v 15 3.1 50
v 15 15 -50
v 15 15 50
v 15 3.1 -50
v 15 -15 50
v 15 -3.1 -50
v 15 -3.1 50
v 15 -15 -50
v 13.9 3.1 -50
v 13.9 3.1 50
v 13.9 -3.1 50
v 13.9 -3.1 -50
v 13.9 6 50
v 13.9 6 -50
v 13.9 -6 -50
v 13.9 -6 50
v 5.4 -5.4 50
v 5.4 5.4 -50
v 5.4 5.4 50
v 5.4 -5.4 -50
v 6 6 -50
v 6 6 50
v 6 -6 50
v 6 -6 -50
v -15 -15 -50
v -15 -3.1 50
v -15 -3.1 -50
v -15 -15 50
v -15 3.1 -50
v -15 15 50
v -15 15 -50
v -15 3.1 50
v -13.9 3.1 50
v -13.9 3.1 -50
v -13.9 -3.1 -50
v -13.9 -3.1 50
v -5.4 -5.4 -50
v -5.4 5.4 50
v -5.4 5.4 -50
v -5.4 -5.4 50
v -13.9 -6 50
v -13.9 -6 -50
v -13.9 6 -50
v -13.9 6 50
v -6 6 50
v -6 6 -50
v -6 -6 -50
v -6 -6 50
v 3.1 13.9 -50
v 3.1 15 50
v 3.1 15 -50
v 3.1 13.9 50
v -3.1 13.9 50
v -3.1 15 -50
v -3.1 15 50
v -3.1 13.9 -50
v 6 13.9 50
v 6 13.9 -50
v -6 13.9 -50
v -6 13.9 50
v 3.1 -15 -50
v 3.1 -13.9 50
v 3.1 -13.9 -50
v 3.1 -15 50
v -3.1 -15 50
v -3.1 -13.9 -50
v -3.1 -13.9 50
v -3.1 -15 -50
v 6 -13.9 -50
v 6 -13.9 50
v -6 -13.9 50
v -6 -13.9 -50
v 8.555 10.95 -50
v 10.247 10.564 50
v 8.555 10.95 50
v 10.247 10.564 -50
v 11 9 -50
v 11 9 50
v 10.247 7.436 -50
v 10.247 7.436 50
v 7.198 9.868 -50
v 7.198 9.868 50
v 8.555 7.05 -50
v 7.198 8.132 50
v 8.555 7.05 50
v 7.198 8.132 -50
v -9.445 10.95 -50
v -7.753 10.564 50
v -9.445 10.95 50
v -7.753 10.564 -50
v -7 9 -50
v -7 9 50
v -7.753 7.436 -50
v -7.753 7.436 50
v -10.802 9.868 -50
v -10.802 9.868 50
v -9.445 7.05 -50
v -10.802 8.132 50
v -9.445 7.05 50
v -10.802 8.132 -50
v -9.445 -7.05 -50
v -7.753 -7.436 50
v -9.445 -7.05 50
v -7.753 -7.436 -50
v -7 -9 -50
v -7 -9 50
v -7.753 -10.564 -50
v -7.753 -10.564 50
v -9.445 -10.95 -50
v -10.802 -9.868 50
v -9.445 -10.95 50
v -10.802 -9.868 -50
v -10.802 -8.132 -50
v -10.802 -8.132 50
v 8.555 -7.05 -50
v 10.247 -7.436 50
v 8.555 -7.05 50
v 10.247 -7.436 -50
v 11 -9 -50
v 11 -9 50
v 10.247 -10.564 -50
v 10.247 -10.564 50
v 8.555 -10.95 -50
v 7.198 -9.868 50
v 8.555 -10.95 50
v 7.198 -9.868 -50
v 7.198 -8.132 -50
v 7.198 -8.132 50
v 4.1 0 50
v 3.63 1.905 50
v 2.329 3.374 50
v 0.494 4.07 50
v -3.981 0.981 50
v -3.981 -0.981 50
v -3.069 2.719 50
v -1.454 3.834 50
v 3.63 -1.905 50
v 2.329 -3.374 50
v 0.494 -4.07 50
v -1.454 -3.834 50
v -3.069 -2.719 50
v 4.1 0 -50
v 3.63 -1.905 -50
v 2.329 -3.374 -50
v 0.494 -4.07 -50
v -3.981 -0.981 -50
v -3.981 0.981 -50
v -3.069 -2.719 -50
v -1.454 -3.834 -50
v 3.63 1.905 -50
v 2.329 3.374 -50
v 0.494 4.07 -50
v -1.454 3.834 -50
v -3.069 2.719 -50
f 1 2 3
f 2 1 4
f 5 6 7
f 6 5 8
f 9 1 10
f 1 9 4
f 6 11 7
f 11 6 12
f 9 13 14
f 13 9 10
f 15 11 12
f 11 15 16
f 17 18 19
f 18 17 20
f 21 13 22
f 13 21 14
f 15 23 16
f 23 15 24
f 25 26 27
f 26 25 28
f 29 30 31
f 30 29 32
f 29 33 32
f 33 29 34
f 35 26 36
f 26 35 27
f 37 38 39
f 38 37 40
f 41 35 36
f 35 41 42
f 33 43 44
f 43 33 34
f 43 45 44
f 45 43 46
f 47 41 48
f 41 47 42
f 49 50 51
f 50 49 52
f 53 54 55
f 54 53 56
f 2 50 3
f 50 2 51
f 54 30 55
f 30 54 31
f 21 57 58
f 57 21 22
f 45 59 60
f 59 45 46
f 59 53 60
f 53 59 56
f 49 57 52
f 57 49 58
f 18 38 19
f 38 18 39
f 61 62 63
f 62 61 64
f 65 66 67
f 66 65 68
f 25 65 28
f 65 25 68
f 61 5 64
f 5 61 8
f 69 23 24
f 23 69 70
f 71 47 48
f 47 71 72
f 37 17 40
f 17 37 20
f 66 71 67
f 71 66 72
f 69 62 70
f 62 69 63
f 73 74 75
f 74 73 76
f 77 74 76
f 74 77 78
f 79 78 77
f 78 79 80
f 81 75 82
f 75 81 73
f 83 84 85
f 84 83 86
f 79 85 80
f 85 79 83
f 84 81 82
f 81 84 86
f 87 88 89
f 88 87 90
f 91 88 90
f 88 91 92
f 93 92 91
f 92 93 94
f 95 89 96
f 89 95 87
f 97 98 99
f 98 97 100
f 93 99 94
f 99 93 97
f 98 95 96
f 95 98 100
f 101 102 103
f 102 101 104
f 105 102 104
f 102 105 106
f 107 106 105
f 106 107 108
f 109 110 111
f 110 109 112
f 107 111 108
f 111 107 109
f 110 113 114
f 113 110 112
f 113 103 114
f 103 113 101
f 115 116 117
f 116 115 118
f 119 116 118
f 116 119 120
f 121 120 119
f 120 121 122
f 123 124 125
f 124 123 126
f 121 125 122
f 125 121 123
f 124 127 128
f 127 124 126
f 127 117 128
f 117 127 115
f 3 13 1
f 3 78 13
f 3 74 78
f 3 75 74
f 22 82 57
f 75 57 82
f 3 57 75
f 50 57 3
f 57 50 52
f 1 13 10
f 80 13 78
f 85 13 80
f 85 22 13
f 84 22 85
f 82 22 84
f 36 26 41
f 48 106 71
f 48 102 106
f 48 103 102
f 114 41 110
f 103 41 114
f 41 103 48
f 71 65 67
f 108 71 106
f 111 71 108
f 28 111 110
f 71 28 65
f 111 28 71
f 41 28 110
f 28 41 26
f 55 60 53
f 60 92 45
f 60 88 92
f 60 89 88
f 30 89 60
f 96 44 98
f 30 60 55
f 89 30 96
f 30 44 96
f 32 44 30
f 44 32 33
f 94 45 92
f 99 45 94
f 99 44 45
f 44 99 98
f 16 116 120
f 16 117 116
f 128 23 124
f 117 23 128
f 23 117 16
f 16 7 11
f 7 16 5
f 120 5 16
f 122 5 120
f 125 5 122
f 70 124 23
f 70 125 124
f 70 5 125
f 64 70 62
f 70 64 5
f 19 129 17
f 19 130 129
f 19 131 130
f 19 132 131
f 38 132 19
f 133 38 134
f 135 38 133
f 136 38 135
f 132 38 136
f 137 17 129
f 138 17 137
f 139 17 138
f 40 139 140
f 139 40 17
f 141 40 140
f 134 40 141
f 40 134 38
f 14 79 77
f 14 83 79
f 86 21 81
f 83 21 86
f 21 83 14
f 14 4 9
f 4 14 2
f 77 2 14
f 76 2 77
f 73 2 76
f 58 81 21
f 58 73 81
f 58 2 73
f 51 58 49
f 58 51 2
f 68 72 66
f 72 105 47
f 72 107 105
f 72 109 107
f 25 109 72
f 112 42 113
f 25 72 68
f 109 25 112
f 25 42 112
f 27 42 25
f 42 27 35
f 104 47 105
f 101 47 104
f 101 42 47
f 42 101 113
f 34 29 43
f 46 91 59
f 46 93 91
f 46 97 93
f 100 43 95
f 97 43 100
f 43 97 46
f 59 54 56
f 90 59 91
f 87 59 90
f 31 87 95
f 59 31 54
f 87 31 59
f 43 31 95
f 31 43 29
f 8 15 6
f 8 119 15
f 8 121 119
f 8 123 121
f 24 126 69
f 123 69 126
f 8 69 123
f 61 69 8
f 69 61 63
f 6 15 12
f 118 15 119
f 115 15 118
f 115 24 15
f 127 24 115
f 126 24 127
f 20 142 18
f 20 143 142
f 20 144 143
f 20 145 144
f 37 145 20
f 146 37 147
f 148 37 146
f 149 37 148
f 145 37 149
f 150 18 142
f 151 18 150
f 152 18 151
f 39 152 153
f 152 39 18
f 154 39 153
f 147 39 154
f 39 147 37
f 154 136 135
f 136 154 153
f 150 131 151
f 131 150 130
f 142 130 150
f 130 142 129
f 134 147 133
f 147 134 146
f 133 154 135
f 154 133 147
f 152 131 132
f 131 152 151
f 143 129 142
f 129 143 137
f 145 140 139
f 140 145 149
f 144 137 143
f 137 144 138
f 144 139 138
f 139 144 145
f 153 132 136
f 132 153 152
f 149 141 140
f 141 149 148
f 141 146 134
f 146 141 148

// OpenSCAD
// Parameters
profile_width_mm = 30; //[15:60:1]
profile_height_mm = 30; //[15:60:1]
length_mm = 100; //[50:200:1]
wall_thickness_mm = 2.2; //[1.1:4.4:0.1]
slot_opening_mm = 6.2; //[3.1:12.4:0.1]
slot_depth_mm = 7.5; //[3.5:14:0.1]
slot_cavity_width_mm = 12.0; //[6:24:0.1]
center_bore_d_mm = 8.2; //[4:16:0.1]
web_thickness_mm = 2.4; //[1.2:5:0.1]
corner_relief_d_mm = 4.0; //[2:8:0.1]
corner_relief_offset_mm = 6.0; //[3:12:0.1]
overlap_mm = 1.0; //[0.5:2.0:0.1]

// E3030 - complete geometry
module extrusion() {
  color("Silver") {
    difference() {
      // Main extrusion body
      cube([profile_width_mm, profile_height_mm, length_mm], center=true);
      
      // T-slot channels
      union() {
        translate([profile_width_mm/2 - (slot_depth_mm + overlap_mm)/2, 0, 0])
          cube([slot_depth_mm + overlap_mm, slot_opening_mm, length_mm + 2*overlap_mm], center=true);
        translate([profile_width_mm/2 - (slot_depth_mm + overlap_mm)/2 - wall_thickness_mm/2, 0, 0])
          cube([slot_depth_mm + overlap_mm, slot_cavity_width_mm, length_mm + 2*overlap_mm], center=true);
        translate([-profile_width_mm/2 + (slot_depth_mm + overlap_mm)/2, 0, 0])
          cube([slot_depth_mm + overlap_mm, slot_opening_mm, length_mm + 2*overlap_mm], center=true);
        translate([-profile_width_mm/2 + (slot_depth_mm + overlap_mm)/2 + wall_thickness_mm/2, 0, 0])
          cube([slot_depth_mm + overlap_mm, slot_cavity_width_mm, length_mm + 2*overlap_mm], center=true);
        translate([0, profile_height_mm/2 - (slot_depth_mm + overlap_mm)/2, 0])
          cube([slot_opening_mm, slot_depth_mm + overlap_mm, length_mm + 2*overlap_mm], center=true);
        translate([0, profile_height_mm/2 - (slot_depth_mm + overlap_mm)/2 - wall_thickness_mm/2, 0])
          cube([slot_cavity_width_mm, slot_depth_mm + overlap_mm, length_mm + 2*overlap_mm], center=true);
        translate([0, -profile_height_mm/2 + (slot_depth_mm + overlap_mm)/2, 0])
          cube([slot_opening_mm, slot_depth_mm + overlap_mm, length_mm + 2*overlap_mm], center=true);
        translate([0, -profile_height_mm/2 + (slot_depth_mm + overlap_mm)/2 + wall_thickness_mm/2, 0])
          cube([slot_cavity_width_mm, slot_depth_mm + overlap_mm, length_mm + 2*overlap_mm], center=true);
      }
      
      // Center bore
      translate([0, 0, 0])
        cylinder(r=center_bore_d_mm/2, h=length_mm + 2*overlap_mm, center=true);
      
      // Corner reliefs
      union() {
        translate([profile_width_mm/2 - corner_relief_offset_mm, profile_height_mm/2 - corner_relief_offset_mm, 0])
          cylinder(r=corner_relief_d_mm/2, h=length_mm + 2*overlap_mm, center=true);
        translate([-profile_width_mm/2 + corner_relief_offset_mm, profile_height_mm/2 - corner_relief_offset_mm, 0])
          cylinder(r=corner_relief_d_mm/2, h=length_mm + 2*overlap_mm, center=true);
        translate([-profile_width_mm/2 + corner_relief_offset_mm, -profile_height_mm/2 + corner_relief_offset_mm, 0])
          cylinder(r=corner_relief_d_mm/2, h=length_mm + 2*overlap_mm, center=true);
        translate([profile_width_mm/2 - corner_relief_offset_mm, -profile_height_mm/2 + corner_relief_offset_mm, 0])
          cylinder(r=corner_relief_d_mm/2, h=length_mm + 2*overlap_mm, center=true);
      }
    }
  }
}

// Extrusion Cross Section - complete geometry
module extrusion_cross_section() {
  color("DimGray") {
    difference() {
      // Main extrusion body
      cube([profile_width_mm, profile_height_mm, length_mm], center=true);
      
      // T-slot channels
      union() {
        translate([profile_width_mm/2 - (slot_depth_mm + overlap_mm)/2, 0, 0])
          cube([slot_depth_mm + overlap_mm, slot_opening_mm, length_mm + 2*overlap_mm], center=true);
        translate([profile_width_mm/2 - (slot_depth_mm + overlap_mm)/2 - wall_thickness_mm/2, 0, 0])
          cube([slot_depth_mm + overlap_mm, slot_cavity_width_mm, length_mm + 2*overlap_mm], center=true);
        translate([-profile_width_mm/2 + (slot_depth_mm + overlap_mm)/2, 0, 0])
          cube([slot_depth_mm + overlap_mm, slot_opening_mm, length_mm + 2*overlap_mm], center=true);
        translate([-profile_width_mm/2 + (slot_depth_mm + overlap_mm)/2 + wall_thickness_mm/2, 0, 0])
          cube([slot_depth_mm + overlap_mm, slot_cavity_width_mm, length_mm + 2*overlap_mm], center=true);
        translate([0, profile_height_mm/2 - (slot_depth_mm + overlap_mm)/2, 0])
          cube([slot_opening_mm, slot_depth_mm + overlap_mm, length_mm + 2*overlap_mm], center=true);
        translate([0, profile_height_mm/2 - (slot_depth_mm + overlap_mm)/2 - wall_thickness_mm/2, 0])
          cube([slot_cavity_width_mm, slot_depth_mm + overlap_mm, length_mm + 2*overlap_mm], center=true);
        translate([0, -profile_height_mm/2 + (slot_depth_mm + overlap_mm)/2, 0])
          cube([slot_opening_mm, slot_depth_mm + overlap_mm, length_mm + 2*overlap_mm], center=true);
        translate([0, -profile_height_mm/2 + (slot_depth_mm + overlap_mm)/2 + wall_thickness_mm/2, 0])
          cube([slot_cavity_width_mm, slot_depth_mm + overlap_mm, length_mm + 2*overlap_mm], center=true);
      }
      
      // Center bore
      translate([0, 0, 0])
        cylinder(r=center_bore_d_mm/2, h=length_mm + 2*overlap_mm, center=true);
      
      // Corner reliefs
      union() {
        translate([profile_width_mm/2 - corner_relief_offset_mm, profile_height_mm/2 - corner_relief_offset_mm, 0])
          cylinder(r=corner_relief_d_mm/2, h=length_mm + 2*overlap_mm, center=true);
        translate([-profile_width_mm/2 + corner_relief_offset_mm, profile_height_mm/2 - corner_relief_offset_mm, 0])
          cylinder(r=corner_relief_d_mm/2, h=length_mm + 2*overlap_mm, center=true);
        translate([-profile_width_mm/2 + corner_relief_offset_mm, -profile_height_mm/2 + corner_relief_offset_mm, 0])
          cylinder(r=corner_relief_d_mm/2, h=length_mm + 2*overlap_mm, center=true);
        translate([profile_width_mm/2 - corner_relief_offset_mm, -profile_height_mm/2 + corner_relief_offset_mm, 0])
          cylinder(r=corner_relief_d_mm/2, h=length_mm + 2*overlap_mm, center=true);
      }
    }
  }
}

// Box Corner Profile Sections - complete geometry
module box_corner_profile_sections() {
  color("Silver") {
    union() {
      box_corner_profile_section();
      rotate([0, 0, 90]) box_corner_profile_section();
      rotate([0, 0, 180]) box_corner_profile_section();
      rotate([0, 0, 270]) box_corner_profile_section();
    }
  }
}

// Box Corner Profile Section - complete geometry
module box_corner_profile_section() {
  color("Silver") {
    translate([profile_width_mm/2 - wall_thickness_mm/2, profile_height_mm/2 - wall_thickness_mm/2, 0])
      cube([wall_thickness_mm, wall_thickness_mm, length_mm], center=true);
  }
}

// Assembly
module assembly() {
  extrusion();
  translate([0, 0, 0]) extrusion_cross_section();
  translate([0, 0, 0]) box_corner_profile_sections();
}

assembly();
